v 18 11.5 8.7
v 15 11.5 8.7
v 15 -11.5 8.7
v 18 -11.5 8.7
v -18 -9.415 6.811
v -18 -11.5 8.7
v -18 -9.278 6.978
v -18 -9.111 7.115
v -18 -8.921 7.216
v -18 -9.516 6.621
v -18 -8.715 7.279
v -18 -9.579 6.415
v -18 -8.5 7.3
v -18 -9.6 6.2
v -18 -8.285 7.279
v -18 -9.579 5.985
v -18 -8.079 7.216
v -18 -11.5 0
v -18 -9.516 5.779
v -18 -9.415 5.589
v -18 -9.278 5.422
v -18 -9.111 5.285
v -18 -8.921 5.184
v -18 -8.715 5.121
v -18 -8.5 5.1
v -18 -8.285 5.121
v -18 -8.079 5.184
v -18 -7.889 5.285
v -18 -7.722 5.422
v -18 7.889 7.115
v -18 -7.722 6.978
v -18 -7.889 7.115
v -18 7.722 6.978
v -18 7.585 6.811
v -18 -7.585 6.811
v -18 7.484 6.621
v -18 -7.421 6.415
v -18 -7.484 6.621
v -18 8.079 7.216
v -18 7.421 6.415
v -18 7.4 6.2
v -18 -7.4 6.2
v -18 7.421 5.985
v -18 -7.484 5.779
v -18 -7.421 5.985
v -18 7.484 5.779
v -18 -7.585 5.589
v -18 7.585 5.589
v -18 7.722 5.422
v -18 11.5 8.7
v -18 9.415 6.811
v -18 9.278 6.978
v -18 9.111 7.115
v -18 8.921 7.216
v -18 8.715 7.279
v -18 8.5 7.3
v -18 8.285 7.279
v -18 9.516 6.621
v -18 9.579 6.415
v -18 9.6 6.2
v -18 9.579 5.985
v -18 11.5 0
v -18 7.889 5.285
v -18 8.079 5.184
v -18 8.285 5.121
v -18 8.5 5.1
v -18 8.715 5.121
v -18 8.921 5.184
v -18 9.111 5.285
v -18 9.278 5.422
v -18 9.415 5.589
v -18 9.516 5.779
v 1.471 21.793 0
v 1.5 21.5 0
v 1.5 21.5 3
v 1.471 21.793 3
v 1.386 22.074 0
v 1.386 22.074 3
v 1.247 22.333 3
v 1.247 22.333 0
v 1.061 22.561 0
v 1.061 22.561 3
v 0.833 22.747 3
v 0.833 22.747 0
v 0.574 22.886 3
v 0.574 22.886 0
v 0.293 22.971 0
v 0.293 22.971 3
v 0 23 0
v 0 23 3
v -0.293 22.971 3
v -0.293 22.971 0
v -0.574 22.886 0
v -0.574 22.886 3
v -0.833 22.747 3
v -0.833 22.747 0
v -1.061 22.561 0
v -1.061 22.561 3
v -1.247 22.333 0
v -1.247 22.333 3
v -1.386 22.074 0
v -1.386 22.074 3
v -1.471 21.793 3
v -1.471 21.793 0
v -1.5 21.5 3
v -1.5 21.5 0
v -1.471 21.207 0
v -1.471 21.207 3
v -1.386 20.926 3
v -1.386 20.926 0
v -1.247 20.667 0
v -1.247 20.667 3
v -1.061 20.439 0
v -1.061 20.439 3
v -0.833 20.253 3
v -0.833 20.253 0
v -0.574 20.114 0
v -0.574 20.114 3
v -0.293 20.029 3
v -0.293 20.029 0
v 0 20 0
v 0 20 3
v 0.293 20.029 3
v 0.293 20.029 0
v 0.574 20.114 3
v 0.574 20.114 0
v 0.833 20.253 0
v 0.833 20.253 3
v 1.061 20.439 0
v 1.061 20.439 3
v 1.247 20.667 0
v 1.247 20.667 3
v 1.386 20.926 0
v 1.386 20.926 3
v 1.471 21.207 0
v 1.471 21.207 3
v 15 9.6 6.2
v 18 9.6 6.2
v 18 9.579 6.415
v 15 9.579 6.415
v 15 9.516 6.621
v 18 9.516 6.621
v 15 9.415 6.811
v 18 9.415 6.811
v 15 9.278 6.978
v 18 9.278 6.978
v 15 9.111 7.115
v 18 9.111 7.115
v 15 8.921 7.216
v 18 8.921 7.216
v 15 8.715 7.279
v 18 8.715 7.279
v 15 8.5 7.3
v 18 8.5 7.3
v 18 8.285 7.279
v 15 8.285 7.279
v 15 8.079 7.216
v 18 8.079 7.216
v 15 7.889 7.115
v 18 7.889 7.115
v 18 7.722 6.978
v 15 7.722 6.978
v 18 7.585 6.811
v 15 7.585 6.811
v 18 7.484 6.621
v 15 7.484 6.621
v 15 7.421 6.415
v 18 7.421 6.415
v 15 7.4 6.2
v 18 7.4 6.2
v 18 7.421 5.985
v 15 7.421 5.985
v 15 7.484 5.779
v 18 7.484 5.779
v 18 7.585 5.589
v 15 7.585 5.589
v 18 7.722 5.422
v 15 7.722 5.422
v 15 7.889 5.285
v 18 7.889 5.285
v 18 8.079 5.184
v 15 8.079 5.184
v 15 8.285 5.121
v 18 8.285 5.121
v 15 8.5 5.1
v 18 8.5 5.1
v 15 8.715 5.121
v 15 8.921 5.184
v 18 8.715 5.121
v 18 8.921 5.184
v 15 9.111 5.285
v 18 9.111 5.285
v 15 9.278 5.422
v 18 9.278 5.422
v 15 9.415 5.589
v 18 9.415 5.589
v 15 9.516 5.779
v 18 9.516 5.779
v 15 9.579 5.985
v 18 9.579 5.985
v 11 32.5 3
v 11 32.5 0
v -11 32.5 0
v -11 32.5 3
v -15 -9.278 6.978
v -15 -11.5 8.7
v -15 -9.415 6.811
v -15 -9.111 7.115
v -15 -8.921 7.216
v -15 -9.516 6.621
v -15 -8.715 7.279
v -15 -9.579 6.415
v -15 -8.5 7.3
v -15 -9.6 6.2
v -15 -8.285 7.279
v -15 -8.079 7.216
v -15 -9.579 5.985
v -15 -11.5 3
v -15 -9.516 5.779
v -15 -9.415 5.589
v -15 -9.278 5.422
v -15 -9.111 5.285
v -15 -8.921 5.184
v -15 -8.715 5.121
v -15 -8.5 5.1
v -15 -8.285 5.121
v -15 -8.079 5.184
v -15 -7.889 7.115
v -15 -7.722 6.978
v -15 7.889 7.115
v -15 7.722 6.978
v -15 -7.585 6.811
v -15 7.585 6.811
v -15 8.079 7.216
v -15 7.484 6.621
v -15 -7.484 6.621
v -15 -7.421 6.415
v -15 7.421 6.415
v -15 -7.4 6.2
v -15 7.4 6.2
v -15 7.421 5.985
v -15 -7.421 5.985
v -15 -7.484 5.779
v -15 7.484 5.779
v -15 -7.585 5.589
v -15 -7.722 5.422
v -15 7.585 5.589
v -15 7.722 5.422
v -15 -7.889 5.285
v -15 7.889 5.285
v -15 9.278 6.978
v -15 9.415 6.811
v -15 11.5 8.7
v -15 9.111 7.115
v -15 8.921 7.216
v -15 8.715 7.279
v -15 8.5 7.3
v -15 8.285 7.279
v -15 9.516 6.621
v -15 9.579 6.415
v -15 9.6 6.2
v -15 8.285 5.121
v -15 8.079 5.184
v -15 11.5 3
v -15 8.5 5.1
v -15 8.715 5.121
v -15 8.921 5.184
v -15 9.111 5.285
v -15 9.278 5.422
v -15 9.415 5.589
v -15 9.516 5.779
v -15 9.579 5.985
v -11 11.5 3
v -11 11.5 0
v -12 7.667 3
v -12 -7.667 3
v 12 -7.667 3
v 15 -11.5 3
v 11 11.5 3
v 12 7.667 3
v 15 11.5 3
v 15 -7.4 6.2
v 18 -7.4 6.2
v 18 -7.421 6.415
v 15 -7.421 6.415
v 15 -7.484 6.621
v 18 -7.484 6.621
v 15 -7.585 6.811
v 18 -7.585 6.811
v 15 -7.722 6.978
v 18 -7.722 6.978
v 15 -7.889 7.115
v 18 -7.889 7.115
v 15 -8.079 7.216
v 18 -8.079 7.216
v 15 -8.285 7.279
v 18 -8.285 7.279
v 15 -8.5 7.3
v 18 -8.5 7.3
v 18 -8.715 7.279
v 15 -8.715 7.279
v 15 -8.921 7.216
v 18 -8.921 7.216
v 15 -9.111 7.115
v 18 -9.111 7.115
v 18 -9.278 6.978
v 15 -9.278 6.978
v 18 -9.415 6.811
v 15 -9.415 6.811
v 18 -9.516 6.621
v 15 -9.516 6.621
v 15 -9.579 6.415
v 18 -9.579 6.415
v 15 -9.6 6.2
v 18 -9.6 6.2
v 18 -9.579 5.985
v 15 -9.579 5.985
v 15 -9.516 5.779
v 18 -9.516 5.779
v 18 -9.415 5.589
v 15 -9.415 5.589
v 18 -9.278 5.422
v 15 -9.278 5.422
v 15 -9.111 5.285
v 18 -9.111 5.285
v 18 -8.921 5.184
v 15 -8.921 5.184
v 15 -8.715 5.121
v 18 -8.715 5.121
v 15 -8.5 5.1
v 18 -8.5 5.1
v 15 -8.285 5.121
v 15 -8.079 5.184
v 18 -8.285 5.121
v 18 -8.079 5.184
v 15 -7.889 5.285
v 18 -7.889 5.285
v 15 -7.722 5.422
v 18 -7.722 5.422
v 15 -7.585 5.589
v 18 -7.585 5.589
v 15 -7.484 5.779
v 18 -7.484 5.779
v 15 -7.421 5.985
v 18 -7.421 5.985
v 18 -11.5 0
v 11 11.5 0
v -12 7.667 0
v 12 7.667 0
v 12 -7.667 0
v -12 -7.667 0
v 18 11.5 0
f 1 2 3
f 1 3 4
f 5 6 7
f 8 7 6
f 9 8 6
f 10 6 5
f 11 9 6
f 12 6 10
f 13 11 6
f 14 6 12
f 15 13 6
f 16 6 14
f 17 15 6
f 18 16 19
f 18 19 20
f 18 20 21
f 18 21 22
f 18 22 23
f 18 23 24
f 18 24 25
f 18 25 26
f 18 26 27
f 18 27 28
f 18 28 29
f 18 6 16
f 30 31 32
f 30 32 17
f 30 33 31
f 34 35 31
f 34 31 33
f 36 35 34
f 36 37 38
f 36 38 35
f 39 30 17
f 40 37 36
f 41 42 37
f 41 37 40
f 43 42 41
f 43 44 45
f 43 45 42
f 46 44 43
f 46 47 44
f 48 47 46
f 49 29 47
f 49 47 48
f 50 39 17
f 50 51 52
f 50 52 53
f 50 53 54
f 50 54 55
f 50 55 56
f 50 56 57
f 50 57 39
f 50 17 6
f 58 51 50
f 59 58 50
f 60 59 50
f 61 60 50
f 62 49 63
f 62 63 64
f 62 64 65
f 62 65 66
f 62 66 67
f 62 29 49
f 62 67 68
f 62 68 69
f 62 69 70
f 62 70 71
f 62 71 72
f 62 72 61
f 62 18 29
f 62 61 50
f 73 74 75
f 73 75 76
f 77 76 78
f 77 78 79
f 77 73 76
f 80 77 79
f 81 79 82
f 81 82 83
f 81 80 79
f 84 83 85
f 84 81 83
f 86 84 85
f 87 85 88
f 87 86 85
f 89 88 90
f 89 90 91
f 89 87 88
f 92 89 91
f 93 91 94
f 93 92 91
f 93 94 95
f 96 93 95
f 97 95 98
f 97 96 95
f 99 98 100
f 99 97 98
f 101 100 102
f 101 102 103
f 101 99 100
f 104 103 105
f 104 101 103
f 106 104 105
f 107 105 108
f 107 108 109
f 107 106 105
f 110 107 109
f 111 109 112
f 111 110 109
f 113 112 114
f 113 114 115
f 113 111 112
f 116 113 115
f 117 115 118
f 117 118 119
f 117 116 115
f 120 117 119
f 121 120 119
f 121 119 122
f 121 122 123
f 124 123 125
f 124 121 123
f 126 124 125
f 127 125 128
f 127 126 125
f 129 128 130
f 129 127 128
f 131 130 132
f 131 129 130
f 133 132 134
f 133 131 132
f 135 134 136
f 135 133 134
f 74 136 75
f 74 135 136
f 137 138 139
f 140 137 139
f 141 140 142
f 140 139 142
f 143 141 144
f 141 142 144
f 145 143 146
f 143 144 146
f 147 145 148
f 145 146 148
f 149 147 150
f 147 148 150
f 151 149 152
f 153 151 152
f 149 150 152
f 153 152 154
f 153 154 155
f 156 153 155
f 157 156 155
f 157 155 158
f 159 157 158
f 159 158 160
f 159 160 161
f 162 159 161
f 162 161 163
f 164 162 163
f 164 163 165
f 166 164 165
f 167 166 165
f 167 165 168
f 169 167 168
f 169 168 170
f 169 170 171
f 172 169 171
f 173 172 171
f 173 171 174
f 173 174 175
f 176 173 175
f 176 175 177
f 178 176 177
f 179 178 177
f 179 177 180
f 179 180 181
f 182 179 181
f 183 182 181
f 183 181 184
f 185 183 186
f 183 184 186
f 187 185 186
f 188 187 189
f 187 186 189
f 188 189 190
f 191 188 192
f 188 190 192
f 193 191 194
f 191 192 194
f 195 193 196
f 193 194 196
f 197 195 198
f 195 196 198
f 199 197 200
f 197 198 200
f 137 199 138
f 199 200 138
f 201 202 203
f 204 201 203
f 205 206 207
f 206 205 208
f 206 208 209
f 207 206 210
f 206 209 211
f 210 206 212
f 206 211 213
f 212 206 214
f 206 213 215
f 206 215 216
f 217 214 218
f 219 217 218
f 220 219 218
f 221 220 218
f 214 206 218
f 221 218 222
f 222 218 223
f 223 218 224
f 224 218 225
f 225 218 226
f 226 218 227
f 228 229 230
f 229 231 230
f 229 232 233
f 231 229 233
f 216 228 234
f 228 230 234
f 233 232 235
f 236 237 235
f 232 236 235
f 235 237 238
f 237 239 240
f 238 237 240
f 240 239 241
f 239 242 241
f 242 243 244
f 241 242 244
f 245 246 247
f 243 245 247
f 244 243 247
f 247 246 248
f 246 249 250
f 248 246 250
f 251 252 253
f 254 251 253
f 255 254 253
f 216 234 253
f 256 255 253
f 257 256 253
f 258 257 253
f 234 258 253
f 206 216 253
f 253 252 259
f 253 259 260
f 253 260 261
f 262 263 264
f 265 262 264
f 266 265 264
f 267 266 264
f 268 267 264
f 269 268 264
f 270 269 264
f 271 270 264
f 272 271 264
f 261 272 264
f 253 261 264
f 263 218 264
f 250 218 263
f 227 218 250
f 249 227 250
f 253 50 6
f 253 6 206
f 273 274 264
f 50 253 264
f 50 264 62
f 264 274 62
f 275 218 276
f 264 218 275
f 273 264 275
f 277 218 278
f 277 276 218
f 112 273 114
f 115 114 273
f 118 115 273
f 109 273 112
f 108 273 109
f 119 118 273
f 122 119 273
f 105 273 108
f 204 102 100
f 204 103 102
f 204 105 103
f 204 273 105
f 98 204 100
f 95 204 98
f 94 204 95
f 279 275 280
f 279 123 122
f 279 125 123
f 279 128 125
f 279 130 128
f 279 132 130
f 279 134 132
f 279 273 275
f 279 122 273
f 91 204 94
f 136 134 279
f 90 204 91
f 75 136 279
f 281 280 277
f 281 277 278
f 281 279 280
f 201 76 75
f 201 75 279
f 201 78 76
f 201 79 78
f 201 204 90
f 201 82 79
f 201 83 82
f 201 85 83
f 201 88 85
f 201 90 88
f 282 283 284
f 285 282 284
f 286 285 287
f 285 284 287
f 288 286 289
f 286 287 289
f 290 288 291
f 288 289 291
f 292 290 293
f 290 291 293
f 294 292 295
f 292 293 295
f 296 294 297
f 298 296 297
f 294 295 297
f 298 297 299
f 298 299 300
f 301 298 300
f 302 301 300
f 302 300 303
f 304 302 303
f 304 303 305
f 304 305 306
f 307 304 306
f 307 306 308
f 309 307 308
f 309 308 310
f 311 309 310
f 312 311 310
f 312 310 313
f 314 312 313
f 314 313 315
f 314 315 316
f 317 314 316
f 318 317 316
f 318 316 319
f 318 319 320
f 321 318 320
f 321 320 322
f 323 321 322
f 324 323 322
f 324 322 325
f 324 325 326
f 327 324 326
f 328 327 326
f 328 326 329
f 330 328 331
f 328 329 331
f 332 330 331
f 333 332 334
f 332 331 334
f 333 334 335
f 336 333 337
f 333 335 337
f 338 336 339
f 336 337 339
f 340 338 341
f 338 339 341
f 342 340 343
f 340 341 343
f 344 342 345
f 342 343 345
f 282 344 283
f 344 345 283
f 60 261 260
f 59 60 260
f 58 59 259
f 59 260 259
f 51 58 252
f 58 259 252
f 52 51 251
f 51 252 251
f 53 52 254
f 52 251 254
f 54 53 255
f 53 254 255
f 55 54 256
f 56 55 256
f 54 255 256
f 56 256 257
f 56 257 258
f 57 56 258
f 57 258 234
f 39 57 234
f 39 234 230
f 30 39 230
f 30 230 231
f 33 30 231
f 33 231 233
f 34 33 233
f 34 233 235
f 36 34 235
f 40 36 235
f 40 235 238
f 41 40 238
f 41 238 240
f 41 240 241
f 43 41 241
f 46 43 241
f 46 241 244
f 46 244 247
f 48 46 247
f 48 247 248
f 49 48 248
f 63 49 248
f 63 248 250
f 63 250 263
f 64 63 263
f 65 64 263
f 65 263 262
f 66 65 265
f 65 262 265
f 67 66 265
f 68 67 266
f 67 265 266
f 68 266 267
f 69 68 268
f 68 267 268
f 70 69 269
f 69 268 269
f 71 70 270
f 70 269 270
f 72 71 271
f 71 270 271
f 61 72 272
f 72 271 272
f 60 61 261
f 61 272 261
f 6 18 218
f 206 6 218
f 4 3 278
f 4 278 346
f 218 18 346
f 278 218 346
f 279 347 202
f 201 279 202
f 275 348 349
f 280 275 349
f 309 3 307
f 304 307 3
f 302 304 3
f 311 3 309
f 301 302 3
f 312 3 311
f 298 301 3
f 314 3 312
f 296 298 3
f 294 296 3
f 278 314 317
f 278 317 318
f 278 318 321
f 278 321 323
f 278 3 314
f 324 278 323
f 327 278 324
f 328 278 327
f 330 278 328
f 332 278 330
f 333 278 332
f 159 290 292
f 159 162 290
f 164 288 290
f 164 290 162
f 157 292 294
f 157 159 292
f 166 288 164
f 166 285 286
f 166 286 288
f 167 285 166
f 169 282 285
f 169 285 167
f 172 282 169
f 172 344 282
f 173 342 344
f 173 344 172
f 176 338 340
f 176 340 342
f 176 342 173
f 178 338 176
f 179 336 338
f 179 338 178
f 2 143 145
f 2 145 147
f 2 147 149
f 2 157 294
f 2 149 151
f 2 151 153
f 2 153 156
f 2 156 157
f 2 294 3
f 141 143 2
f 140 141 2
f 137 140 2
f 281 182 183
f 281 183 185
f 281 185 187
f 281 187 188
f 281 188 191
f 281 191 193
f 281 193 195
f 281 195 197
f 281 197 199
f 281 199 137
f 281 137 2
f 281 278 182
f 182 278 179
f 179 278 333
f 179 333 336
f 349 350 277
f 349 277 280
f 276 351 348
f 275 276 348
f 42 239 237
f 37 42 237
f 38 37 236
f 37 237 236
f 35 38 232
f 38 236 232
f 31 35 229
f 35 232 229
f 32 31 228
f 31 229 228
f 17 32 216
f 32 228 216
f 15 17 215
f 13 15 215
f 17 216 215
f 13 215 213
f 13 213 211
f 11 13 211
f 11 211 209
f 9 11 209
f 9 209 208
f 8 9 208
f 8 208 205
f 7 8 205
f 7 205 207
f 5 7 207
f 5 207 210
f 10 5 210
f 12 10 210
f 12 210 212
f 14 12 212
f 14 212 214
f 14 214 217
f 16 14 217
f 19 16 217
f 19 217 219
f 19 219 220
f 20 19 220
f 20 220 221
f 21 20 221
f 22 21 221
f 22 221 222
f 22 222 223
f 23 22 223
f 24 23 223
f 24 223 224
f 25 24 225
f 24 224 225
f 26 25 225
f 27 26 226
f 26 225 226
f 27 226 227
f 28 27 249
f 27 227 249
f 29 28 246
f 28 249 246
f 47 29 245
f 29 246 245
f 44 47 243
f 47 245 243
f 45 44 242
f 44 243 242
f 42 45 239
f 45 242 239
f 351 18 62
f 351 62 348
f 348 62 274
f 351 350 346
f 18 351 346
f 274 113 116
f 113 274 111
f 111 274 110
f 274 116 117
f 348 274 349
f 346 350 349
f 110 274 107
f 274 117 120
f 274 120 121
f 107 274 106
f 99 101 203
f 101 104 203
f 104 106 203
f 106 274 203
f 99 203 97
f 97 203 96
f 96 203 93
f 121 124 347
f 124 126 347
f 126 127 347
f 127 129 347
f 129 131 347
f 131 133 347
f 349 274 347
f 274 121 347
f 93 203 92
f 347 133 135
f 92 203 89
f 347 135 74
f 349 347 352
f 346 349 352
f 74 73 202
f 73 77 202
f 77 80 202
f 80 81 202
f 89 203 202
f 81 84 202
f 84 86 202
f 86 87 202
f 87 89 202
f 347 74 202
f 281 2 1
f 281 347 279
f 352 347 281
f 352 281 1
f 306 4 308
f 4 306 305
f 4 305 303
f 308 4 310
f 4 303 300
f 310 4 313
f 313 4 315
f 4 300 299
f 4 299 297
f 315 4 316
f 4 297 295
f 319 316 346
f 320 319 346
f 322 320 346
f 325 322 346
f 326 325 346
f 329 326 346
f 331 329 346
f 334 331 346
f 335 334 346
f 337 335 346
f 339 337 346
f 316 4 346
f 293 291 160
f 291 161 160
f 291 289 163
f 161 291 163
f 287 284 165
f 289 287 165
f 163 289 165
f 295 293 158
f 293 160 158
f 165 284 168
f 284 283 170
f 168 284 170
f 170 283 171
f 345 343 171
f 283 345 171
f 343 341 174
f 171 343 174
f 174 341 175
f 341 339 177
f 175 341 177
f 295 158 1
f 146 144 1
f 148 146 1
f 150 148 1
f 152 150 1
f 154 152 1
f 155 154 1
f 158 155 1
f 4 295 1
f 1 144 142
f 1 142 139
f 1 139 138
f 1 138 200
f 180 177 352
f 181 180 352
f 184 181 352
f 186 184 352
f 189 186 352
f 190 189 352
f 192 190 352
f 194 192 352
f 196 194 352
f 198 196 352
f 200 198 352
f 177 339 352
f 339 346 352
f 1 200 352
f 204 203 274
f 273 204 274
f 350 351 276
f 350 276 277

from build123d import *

# Parameters (mm, degrees)
SKETCH1_W           = 24
SKETCH1_H           = 15.333333334
SKETCH1_R           = 1.5
BOSS_EXTRUDE1_DEPTH = 3
SKETCH1_4_W         = 3
SKETCH1_4_H         = 23
BOSS_EXTRUDE2_DEPTH = 8.7
CUT_EXTRUDE1_REACH  = 51.274
SKETCH2_R           = 1.1


with BuildPart() as part:
    # Sketch1 → Boss-Extrude1 (new body)
    with BuildSketch(Plane.XY):
        Polygon((-11, 32.5), (-11, 11.5), (-15, 11.5), (-15, -11.5), (15, -11.5), (15, 11.5), (11, 11.5), (11, 32.5), align=None)
        Rectangle(SKETCH1_W, SKETCH1_H, mode=Mode.SUBTRACT)
        with Locations((0, 21.5)):
            Circle(SKETCH1_R, mode=Mode.SUBTRACT)
    extrude(amount=BOSS_EXTRUDE1_DEPTH)

    # Sketch1<4> → Boss-Extrude2 (add)
    with BuildSketch(Plane.XY):
        with Locations((16.5, 0)):
            Rectangle(SKETCH1_4_W, SKETCH1_4_H)
        with Locations((-16.5, 0)):
            Rectangle(SKETCH1_4_W, SKETCH1_4_H)
    extrude(amount=BOSS_EXTRUDE2_DEPTH)

    # Cut-Extrude1: up to this face of the body (flat: up to its plane)
    cut_extrude1_end = Plane(part.part.faces().sort_by_distance((-18, 0, 4.35))[0])
    # Sketch2 → Cut-Extrude1 (cut, up to the picked face)
    with BuildSketch(Plane(origin=(18, 0, 0), x_dir=(0, 0, -1), z_dir=(1, 0, 0)), mode=Mode.PRIVATE) as cut_extrude1_sk1:
        with Locations(Location((-6.2, 8.5, 0), (0, 0, 90))):
            Circle(SKETCH2_R)
    cut_extrude1_tool1 = split(extrude(cut_extrude1_sk1.sketch, amount=-CUT_EXTRUDE1_REACH, mode=Mode.PRIVATE), bisect_by=cut_extrude1_end, keep=Keep.BOTH, mode=Mode.PRIVATE)
    # Sketch2 → Cut-Extrude1 (cut, up to the picked face)
    with BuildSketch(Plane(origin=(18, 0, 0), x_dir=(0, 0, -1), z_dir=(1, 0, 0)), mode=Mode.PRIVATE) as cut_extrude1_sk2:
        with Locations(Location((-6.2, -8.5, 0), (0, 0, 90))):
            Circle(SKETCH2_R)
    cut_extrude1_tool2 = split(extrude(cut_extrude1_sk2.sketch, amount=-CUT_EXTRUDE1_REACH, mode=Mode.PRIVATE), bisect_by=cut_extrude1_end, keep=Keep.BOTH, mode=Mode.PRIVATE)
    add(cut_extrude1_tool1.solids().sort_by(Axis((18, 8.5, 6.2), (-1, 0, 0)))[0], mode=Mode.SUBTRACT)
    add(cut_extrude1_tool2.solids().sort_by(Axis((18, -8.5, 6.2), (-1, 0, 0)))[0], mode=Mode.SUBTRACT)


solid = part.part
